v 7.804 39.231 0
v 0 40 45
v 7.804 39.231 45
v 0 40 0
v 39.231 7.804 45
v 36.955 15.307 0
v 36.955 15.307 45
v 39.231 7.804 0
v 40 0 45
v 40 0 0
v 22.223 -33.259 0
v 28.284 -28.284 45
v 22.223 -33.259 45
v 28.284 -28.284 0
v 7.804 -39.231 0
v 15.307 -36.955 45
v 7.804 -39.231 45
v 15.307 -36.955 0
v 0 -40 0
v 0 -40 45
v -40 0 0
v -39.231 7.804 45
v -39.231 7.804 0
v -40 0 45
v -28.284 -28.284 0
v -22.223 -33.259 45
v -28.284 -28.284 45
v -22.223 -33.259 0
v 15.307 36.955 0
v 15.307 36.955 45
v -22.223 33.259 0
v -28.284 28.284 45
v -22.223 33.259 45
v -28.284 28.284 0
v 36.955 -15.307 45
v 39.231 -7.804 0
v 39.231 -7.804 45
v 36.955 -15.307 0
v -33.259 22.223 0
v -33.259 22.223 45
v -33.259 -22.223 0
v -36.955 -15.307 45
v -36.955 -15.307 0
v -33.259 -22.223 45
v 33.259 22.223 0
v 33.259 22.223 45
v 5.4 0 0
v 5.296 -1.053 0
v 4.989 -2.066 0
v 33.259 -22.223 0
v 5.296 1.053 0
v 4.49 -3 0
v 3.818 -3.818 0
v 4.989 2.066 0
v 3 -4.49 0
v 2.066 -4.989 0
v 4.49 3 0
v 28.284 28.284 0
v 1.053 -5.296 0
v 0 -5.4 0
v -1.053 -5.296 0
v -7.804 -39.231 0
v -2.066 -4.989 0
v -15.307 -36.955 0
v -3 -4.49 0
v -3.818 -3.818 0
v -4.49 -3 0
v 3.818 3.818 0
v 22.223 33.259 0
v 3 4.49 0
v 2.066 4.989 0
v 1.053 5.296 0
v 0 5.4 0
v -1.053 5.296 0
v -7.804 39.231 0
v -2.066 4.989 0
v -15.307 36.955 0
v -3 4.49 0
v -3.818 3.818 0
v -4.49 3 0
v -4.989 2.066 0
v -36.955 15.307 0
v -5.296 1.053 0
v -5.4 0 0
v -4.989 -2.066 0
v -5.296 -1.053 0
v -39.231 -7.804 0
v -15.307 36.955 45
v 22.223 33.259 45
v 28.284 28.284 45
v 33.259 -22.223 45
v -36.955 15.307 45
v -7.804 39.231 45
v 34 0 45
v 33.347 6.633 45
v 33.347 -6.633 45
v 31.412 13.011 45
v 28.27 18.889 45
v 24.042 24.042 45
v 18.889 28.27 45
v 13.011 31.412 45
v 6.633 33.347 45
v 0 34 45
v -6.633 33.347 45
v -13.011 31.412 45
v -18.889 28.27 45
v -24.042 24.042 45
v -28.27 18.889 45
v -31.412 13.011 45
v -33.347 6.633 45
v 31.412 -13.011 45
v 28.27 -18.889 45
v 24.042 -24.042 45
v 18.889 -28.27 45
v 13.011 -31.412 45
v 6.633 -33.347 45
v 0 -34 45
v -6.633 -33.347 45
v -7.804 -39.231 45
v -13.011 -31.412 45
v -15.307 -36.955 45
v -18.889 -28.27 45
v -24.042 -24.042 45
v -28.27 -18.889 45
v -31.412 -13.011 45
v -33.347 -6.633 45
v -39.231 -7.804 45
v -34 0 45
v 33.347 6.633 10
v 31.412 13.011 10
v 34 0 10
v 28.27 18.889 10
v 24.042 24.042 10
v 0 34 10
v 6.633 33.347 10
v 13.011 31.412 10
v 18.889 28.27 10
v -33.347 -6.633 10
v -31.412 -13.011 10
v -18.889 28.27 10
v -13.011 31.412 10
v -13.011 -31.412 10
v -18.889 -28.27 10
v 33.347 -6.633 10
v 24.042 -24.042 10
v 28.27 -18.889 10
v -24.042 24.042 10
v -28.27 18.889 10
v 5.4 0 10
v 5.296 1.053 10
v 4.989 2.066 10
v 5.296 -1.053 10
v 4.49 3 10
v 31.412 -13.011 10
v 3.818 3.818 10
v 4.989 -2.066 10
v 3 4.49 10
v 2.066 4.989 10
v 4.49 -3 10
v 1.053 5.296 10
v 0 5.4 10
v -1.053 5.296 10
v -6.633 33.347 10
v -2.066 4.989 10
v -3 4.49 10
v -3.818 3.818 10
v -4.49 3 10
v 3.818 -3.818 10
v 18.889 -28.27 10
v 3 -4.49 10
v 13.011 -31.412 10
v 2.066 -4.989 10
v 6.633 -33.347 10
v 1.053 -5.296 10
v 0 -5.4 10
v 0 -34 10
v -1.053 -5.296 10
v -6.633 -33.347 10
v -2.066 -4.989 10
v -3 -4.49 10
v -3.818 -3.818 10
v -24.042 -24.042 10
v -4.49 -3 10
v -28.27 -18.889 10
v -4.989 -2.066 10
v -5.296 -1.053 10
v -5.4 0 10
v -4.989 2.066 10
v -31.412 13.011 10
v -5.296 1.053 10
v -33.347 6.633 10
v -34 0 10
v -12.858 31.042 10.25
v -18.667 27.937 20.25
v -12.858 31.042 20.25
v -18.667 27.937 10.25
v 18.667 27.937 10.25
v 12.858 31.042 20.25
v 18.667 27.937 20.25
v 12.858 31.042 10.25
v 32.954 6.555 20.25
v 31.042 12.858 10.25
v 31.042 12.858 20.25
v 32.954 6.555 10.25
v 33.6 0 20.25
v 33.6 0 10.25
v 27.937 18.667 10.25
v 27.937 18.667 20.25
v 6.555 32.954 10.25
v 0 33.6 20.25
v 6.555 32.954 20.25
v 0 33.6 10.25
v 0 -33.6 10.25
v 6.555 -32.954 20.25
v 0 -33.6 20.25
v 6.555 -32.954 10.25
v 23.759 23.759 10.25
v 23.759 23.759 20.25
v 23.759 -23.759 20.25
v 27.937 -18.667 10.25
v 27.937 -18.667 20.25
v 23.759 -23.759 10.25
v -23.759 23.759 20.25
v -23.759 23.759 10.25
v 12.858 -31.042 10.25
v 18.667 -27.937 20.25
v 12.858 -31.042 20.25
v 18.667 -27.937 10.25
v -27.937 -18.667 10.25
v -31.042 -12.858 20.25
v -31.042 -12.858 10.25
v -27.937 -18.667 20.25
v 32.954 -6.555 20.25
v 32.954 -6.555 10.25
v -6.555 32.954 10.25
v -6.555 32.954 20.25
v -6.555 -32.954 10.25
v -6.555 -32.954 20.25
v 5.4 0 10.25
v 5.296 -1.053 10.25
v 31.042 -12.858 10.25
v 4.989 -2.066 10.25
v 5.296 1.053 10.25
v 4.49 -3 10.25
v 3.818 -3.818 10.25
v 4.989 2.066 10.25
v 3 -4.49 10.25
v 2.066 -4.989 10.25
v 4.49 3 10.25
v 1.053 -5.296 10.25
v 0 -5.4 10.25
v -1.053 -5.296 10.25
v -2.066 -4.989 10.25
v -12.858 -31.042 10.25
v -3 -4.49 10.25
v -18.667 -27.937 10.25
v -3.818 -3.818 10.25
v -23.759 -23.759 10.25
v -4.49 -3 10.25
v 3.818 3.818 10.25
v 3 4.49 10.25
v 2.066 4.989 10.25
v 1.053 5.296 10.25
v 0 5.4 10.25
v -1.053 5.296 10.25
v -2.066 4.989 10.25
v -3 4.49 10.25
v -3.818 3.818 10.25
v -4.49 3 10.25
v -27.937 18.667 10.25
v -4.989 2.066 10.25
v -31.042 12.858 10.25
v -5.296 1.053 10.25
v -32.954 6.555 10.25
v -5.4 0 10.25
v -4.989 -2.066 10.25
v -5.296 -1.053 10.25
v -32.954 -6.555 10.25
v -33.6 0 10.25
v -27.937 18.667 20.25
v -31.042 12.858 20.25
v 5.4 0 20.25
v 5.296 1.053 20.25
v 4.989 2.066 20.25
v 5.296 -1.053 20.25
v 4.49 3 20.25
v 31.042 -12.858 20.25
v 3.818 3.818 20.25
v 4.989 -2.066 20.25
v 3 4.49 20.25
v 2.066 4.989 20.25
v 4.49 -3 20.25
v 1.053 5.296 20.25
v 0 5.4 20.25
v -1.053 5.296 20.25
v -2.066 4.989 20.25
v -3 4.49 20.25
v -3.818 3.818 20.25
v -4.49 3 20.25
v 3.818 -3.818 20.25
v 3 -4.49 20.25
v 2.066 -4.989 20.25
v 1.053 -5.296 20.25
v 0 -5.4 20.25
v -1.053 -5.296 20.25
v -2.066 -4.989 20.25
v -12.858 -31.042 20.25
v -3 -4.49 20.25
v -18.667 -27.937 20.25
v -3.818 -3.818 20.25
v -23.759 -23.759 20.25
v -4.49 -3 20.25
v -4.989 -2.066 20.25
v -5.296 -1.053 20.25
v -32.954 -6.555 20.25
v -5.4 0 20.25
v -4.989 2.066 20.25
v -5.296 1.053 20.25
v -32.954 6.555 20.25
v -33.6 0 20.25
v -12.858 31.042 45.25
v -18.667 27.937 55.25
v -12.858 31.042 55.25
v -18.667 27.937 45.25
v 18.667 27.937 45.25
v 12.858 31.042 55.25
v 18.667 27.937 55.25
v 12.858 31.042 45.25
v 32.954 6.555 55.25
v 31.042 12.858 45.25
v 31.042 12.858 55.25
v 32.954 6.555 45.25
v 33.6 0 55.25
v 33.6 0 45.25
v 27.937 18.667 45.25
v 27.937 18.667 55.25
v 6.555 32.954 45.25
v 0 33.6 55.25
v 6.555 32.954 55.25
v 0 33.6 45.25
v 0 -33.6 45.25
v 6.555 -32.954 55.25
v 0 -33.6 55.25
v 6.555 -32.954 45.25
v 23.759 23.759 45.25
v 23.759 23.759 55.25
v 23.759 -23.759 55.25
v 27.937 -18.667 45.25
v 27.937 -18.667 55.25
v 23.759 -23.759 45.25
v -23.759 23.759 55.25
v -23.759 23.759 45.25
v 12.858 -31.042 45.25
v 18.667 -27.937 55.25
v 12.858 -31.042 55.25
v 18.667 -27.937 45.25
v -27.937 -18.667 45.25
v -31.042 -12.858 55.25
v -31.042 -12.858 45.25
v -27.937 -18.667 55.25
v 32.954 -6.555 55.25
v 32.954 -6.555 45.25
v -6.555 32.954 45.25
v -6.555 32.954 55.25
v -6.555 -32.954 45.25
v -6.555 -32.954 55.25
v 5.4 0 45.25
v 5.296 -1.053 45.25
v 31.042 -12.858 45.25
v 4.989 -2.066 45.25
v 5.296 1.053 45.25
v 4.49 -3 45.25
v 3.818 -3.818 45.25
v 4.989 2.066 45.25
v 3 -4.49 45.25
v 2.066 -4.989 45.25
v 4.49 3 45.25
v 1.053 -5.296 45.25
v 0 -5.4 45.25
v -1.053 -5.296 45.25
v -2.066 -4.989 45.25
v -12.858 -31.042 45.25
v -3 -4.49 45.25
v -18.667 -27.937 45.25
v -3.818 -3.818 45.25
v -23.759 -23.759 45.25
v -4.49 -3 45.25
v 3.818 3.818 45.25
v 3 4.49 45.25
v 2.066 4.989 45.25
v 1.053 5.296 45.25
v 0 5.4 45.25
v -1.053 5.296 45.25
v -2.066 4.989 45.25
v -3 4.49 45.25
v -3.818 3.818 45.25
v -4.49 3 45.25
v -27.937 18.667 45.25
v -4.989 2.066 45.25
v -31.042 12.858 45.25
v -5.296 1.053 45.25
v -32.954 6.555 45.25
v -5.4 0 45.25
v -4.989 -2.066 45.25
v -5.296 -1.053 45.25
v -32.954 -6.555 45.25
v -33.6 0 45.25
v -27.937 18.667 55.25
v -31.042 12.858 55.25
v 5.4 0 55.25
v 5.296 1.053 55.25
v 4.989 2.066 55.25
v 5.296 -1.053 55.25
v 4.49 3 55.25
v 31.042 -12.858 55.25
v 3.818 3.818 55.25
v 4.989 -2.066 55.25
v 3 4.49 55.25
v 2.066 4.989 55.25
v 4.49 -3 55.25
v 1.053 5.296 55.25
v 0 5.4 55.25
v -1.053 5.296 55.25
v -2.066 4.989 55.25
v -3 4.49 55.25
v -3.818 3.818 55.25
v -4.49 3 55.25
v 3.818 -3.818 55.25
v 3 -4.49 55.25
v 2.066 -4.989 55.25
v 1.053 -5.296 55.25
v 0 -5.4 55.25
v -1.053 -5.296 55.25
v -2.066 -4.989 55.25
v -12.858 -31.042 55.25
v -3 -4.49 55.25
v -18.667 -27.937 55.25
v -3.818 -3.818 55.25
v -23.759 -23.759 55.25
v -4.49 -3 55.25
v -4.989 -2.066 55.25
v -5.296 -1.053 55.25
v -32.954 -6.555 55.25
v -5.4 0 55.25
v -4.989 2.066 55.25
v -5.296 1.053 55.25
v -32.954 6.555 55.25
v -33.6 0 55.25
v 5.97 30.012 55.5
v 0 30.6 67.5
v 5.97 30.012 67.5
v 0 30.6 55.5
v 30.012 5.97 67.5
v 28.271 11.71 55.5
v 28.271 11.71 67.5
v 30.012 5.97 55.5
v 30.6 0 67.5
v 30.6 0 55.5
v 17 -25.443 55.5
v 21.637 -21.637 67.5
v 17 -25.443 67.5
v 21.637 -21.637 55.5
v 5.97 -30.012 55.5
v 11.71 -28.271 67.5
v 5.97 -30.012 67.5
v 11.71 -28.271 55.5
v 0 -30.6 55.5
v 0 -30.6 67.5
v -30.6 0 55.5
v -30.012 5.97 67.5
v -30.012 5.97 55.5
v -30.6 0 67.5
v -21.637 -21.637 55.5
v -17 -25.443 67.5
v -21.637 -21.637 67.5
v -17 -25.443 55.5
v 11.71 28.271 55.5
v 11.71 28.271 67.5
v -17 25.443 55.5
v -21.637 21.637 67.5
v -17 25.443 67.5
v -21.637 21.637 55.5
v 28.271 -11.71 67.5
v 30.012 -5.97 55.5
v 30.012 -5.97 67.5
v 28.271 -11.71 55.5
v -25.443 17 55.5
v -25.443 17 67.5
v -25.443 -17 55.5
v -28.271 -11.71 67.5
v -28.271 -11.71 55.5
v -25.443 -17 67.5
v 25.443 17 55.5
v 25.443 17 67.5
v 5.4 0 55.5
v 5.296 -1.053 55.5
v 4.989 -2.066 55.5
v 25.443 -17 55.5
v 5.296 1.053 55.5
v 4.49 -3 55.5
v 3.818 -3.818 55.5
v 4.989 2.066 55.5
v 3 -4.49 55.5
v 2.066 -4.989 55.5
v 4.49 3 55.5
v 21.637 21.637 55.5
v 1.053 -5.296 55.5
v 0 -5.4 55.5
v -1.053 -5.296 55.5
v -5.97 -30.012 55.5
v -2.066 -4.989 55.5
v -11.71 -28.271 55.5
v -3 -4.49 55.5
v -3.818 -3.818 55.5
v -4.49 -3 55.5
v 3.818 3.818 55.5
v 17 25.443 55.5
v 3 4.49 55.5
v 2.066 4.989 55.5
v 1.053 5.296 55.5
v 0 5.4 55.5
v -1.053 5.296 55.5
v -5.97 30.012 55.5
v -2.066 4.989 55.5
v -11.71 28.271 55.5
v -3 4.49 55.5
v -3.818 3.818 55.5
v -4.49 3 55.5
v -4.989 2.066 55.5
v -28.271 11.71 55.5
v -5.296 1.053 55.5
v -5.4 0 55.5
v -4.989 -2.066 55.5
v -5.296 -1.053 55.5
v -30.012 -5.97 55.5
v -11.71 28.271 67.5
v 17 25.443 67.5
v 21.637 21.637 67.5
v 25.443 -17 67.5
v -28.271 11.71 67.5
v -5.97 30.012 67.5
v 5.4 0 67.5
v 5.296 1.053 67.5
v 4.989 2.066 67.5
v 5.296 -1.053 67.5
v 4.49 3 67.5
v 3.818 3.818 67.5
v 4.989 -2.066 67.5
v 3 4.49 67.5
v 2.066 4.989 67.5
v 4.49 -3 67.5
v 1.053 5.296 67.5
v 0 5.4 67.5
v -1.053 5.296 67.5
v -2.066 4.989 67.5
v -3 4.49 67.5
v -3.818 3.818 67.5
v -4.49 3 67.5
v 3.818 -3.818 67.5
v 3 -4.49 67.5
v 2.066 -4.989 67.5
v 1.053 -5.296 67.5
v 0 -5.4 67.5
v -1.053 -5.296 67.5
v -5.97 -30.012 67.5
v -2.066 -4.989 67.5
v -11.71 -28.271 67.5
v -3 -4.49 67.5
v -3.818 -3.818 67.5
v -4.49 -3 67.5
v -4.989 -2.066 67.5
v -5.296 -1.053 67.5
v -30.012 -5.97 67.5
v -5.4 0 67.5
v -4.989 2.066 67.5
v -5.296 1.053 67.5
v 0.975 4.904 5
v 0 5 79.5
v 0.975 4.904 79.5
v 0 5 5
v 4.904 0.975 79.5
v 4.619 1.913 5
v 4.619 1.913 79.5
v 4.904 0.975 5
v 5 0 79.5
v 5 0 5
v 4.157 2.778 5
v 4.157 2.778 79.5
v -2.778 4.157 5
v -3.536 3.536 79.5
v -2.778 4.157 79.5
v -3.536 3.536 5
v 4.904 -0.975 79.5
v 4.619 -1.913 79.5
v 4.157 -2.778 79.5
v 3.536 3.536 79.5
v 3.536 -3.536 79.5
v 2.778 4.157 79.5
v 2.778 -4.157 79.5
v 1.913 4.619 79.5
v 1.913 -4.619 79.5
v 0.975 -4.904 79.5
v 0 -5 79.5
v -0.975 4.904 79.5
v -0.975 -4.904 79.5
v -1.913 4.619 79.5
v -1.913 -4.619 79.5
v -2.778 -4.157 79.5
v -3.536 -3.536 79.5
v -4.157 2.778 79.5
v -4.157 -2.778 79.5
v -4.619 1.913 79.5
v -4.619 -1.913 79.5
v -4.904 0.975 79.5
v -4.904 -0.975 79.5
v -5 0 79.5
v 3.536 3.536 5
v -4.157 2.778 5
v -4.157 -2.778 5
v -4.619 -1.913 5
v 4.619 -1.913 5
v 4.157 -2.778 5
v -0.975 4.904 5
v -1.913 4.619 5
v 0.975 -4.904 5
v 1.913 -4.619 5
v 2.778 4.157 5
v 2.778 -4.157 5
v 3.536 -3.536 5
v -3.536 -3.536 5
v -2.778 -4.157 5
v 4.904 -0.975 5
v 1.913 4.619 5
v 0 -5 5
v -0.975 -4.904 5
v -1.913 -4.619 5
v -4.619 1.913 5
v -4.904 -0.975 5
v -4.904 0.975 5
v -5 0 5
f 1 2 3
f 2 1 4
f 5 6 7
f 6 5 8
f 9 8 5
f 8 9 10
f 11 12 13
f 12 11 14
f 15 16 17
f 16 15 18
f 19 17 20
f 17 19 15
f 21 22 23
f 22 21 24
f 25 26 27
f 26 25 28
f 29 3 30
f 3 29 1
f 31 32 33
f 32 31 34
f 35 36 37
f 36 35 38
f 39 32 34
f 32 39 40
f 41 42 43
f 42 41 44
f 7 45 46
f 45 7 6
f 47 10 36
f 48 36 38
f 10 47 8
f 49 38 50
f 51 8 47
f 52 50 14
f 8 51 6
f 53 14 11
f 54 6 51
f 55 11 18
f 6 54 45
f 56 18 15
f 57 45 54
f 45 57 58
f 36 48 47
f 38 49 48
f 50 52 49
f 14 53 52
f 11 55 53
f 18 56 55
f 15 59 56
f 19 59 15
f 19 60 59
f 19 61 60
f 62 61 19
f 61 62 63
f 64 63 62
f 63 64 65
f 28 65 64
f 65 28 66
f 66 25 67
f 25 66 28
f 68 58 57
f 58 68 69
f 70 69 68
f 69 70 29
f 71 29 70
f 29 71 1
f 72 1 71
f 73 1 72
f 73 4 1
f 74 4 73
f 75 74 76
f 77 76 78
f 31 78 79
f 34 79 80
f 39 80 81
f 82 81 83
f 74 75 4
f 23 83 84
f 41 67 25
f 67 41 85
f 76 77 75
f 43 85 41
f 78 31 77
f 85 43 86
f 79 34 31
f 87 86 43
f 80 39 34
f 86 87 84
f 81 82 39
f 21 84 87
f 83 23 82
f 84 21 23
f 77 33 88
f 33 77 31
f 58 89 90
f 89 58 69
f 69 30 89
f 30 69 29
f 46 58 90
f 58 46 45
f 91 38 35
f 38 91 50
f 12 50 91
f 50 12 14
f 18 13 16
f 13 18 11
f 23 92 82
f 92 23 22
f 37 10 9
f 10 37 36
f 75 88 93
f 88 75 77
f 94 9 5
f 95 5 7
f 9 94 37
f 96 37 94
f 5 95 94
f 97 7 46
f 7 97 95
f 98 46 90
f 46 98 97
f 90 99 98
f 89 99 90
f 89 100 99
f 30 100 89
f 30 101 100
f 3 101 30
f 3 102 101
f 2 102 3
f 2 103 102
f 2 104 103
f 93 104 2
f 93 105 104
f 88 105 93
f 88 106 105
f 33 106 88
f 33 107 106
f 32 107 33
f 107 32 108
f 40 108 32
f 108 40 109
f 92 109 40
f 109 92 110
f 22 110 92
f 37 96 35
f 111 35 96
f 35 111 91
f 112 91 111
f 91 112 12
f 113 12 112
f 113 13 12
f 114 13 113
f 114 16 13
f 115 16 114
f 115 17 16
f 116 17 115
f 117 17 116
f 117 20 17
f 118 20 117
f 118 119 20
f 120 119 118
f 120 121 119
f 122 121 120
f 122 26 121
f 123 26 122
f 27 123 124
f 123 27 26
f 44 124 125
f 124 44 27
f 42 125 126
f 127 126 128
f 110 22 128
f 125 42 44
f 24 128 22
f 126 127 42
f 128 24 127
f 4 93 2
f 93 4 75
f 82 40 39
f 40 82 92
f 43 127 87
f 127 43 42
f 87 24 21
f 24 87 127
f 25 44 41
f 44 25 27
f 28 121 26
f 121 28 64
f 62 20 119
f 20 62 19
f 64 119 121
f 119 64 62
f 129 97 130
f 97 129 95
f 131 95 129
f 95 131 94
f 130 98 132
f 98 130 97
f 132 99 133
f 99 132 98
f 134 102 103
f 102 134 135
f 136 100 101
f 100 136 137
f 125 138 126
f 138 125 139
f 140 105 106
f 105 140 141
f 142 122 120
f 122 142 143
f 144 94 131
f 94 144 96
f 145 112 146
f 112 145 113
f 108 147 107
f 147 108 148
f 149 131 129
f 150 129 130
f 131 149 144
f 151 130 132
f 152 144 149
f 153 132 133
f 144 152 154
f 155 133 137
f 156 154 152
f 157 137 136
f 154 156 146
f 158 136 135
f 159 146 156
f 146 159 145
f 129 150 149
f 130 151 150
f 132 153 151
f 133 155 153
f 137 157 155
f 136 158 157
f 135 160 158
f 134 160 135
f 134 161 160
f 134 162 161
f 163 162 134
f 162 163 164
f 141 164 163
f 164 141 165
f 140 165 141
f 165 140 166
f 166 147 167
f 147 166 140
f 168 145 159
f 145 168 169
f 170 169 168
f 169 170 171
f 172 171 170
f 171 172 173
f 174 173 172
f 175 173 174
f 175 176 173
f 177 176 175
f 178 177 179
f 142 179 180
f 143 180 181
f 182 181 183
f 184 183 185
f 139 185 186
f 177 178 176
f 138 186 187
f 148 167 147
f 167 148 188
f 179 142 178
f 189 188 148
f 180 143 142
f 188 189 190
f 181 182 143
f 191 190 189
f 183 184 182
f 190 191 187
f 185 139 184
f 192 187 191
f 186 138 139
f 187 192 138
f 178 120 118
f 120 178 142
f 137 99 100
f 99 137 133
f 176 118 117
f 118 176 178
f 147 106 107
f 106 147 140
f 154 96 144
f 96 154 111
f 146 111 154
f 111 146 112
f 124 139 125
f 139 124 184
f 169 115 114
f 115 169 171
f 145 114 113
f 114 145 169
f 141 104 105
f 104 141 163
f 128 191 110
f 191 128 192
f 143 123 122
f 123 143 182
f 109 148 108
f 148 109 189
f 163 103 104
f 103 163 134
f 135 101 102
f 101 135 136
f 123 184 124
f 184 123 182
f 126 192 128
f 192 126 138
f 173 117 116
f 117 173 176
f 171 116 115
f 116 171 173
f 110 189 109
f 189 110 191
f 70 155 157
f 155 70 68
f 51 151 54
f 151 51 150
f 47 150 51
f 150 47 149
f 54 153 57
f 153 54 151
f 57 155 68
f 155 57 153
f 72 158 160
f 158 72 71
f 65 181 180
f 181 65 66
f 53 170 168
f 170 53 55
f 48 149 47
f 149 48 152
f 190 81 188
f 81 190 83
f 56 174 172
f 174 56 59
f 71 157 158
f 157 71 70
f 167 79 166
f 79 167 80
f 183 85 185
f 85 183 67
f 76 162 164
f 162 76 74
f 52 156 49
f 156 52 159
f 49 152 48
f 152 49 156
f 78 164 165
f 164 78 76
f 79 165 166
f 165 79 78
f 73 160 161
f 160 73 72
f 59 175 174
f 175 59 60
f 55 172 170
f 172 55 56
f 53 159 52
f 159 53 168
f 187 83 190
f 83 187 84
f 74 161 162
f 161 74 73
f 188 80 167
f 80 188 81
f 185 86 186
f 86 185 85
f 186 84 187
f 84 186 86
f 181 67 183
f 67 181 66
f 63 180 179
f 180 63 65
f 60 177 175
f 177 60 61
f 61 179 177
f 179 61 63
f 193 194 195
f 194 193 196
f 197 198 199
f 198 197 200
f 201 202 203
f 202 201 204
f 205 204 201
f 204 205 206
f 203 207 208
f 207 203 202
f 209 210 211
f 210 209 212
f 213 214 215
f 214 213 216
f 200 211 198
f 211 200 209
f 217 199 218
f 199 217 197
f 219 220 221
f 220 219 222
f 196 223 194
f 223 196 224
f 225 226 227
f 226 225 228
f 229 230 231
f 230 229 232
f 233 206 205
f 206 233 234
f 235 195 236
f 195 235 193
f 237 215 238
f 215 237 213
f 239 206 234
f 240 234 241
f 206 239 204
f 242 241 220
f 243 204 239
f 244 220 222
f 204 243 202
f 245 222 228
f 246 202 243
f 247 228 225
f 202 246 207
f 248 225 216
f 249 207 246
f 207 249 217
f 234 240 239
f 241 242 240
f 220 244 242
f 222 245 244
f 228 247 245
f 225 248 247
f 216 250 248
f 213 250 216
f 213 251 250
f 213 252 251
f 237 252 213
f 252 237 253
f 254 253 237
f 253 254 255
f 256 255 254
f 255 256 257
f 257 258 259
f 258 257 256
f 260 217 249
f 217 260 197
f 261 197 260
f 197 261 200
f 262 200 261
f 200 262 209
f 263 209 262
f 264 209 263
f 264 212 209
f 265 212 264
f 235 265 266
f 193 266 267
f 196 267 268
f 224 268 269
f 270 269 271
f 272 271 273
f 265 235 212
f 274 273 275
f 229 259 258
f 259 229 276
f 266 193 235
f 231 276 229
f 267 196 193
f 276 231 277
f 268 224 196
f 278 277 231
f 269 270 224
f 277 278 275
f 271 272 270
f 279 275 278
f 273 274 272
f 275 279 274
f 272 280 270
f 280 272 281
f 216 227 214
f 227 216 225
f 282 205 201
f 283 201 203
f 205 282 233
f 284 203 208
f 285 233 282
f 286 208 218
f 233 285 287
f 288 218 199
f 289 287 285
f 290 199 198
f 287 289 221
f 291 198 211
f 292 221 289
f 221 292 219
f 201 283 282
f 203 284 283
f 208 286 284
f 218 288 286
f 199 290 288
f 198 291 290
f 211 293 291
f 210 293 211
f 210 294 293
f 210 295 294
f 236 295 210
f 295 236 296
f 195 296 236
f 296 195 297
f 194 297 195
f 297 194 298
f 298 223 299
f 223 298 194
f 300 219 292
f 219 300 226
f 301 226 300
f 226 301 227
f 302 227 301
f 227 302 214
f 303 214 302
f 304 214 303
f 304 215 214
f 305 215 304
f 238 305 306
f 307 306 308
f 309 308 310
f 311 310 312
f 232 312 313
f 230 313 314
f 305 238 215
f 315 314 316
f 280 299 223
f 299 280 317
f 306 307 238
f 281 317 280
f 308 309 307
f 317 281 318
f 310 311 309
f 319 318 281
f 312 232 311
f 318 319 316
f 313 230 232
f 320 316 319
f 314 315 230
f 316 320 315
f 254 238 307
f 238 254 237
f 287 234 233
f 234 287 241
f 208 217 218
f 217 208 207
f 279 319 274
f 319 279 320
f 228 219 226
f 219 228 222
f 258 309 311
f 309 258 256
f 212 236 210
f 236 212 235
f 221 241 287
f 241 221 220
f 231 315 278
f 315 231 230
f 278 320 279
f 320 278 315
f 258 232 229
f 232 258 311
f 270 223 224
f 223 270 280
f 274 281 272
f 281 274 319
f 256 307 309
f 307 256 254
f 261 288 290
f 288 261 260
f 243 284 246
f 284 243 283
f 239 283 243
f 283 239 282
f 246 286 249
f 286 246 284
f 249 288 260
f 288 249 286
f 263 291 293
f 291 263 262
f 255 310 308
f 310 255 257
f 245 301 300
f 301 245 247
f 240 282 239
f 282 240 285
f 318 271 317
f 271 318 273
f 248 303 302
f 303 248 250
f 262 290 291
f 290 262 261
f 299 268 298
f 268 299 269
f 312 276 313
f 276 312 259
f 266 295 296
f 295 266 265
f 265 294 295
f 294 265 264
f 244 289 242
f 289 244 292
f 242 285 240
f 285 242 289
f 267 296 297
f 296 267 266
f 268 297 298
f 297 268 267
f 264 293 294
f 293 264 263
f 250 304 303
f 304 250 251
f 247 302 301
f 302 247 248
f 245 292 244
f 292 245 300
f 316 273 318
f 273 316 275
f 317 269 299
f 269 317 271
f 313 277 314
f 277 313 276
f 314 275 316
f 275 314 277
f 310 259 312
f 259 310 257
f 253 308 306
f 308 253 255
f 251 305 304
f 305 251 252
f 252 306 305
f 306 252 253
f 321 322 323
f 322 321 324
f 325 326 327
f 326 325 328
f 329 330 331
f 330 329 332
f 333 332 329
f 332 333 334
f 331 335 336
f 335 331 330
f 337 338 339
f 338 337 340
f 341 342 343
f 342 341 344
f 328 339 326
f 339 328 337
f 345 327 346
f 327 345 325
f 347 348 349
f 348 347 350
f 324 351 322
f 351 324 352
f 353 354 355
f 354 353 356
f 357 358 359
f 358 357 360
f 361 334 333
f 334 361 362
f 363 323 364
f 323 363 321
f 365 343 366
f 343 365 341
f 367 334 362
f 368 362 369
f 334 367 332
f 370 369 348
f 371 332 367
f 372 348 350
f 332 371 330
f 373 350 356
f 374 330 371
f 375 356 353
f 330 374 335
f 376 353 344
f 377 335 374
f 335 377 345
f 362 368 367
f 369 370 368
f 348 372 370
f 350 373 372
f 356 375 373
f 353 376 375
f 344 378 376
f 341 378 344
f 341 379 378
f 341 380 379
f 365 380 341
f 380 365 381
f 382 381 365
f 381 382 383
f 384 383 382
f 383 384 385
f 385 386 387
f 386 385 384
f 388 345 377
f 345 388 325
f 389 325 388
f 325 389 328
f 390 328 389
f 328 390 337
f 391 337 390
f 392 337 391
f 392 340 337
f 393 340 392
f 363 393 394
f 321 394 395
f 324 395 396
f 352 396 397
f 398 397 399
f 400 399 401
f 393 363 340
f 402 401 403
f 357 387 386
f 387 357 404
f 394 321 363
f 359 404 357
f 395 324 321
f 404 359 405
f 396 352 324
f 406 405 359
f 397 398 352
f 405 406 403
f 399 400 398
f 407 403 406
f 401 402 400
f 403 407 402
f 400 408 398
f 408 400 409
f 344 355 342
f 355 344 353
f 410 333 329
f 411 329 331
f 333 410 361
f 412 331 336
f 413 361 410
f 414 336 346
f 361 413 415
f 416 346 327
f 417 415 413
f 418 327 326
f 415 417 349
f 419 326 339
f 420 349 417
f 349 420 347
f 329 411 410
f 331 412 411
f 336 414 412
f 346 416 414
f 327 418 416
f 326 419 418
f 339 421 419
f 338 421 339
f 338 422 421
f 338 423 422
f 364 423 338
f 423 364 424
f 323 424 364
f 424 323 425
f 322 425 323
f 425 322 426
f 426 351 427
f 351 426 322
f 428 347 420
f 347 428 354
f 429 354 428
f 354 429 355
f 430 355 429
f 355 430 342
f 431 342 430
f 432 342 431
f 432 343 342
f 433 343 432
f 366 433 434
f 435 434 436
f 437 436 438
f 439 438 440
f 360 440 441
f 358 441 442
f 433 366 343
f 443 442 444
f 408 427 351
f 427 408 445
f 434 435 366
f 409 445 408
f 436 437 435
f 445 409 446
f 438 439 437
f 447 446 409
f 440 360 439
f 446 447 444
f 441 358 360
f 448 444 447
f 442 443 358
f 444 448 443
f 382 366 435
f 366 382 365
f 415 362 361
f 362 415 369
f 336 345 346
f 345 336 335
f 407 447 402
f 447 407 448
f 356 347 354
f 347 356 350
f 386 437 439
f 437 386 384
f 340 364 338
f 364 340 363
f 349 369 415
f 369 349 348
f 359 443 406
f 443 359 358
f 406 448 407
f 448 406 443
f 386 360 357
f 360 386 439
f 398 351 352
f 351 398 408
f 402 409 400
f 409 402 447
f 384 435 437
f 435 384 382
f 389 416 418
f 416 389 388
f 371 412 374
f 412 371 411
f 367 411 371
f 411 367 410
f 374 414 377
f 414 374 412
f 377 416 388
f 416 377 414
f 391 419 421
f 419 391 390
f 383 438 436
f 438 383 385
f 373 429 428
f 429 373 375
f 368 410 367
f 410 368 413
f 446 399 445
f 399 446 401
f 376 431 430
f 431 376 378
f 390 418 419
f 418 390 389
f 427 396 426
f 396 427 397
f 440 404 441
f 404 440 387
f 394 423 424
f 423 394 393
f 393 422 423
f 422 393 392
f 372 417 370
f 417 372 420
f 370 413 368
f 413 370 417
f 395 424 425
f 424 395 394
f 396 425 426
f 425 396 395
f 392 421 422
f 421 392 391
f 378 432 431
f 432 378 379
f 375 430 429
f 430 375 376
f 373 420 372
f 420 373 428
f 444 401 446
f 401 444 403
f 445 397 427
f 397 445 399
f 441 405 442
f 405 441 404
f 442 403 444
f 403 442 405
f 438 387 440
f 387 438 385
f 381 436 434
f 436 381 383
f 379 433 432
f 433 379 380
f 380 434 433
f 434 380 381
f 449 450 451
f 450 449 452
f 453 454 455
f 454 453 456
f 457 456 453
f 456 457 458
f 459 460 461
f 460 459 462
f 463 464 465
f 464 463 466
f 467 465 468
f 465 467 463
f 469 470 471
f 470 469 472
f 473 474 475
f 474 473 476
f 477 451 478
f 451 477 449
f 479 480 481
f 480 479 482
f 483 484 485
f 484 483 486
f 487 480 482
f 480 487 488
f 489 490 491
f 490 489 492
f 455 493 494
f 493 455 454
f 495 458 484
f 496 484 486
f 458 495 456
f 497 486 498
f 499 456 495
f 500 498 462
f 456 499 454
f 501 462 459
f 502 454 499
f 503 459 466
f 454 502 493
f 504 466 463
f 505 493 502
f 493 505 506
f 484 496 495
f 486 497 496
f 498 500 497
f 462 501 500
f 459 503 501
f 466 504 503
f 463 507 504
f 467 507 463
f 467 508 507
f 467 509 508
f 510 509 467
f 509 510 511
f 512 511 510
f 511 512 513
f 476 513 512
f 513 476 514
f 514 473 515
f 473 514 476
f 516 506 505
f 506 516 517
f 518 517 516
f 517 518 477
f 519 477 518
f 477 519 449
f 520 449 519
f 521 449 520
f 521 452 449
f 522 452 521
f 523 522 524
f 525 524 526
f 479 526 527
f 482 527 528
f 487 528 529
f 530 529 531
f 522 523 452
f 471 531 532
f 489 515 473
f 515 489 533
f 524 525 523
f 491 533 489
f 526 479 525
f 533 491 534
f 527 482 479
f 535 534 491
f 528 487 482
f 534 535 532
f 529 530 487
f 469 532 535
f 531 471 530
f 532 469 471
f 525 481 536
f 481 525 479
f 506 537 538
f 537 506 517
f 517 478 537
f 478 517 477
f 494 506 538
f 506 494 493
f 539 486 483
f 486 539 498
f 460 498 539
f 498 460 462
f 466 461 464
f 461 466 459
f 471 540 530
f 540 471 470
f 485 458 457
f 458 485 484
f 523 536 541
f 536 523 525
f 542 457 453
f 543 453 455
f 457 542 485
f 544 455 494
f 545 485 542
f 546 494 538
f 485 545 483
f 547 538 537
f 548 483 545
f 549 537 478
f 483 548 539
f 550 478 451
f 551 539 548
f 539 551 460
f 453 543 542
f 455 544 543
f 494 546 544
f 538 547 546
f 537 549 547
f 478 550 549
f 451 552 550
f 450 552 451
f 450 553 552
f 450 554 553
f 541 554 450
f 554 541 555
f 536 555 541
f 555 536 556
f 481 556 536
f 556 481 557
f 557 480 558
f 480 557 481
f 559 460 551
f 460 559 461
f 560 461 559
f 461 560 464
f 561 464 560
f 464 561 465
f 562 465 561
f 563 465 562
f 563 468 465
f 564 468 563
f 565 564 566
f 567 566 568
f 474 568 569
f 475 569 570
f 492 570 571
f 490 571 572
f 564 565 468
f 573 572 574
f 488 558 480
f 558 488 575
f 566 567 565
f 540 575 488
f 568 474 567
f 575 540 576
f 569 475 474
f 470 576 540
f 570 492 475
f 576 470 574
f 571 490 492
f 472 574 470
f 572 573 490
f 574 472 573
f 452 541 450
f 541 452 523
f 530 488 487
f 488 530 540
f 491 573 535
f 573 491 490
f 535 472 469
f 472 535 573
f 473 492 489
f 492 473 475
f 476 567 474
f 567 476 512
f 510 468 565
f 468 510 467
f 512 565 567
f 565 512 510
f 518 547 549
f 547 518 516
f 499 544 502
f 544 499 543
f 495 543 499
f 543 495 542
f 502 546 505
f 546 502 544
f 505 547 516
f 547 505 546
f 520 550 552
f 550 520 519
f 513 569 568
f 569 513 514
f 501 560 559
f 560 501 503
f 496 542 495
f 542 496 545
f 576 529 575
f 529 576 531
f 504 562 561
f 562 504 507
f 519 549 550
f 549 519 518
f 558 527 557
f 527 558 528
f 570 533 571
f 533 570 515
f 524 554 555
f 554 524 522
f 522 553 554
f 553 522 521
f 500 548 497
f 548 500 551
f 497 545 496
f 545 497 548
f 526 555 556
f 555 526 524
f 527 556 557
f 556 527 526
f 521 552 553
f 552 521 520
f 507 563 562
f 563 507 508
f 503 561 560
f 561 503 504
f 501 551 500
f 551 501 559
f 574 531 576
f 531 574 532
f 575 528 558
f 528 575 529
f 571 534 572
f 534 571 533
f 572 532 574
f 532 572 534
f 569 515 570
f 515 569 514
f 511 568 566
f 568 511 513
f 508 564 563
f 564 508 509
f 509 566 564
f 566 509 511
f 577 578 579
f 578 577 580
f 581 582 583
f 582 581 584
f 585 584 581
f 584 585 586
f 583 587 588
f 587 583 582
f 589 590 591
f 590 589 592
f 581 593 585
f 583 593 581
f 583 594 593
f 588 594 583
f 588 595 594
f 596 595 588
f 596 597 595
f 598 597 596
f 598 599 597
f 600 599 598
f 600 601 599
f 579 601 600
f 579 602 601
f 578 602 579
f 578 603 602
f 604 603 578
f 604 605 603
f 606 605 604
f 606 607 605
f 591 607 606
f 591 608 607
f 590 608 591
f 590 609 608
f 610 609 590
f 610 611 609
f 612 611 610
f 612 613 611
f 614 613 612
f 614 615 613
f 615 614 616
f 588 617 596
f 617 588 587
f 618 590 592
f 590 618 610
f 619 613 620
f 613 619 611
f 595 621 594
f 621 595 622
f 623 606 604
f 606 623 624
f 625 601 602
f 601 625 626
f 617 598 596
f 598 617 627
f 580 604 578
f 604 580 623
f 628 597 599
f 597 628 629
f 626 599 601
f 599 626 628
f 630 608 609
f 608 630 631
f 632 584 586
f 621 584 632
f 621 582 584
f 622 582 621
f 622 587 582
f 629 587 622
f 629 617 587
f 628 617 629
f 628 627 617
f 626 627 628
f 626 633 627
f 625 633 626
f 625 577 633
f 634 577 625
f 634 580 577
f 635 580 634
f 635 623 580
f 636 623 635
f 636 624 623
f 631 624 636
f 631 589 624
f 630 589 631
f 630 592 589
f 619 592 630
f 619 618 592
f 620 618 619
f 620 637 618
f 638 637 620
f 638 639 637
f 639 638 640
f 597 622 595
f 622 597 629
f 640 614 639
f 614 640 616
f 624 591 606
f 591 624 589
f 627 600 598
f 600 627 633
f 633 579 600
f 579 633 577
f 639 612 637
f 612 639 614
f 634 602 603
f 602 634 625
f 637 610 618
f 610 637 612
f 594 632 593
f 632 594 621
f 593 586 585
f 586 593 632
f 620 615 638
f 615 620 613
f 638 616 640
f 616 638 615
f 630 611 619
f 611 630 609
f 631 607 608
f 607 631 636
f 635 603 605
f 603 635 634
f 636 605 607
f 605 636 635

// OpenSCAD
$fn = 32;

// ------------------------------------------------------------------------
// Bearing housing: housing d80, two bearings and a shaft
// Every part is its own module, assembly() places them once.
// ------------------------------------------------------------------------

// --- part 1 ---
module housing() {
  difference() {
    cylinder(h = 45, d = 80);
    translate([0, 0, 10]) cylinder(h = 36, d = 68);
    translate([0, 0, -1]) cylinder(h = 12, d = 10.8);
  }
}

// --- part 2 ---
module bearing_lower() {
  difference() {
      translate([0, 0, 0]) cylinder(h = 10, d = 67.2);
      translate([0, 0, -1]) cylinder(h = 12, d = 10.8);
    }
}

// --- part 3 ---
module bearing_upper() {
  difference() {
      translate([0, 0, 0]) cylinder(h = 10, d = 67.2);
      translate([0, 0, -1]) cylinder(h = 12, d = 10.8);
    }
}

// --- part 4 ---
module spacer() {
  difference() {
      translate([0, 0, 0]) cylinder(h = 12, d = 61.2);
      translate([0, 0, -1]) cylinder(h = 14, d = 10.8);
    }
}

// --- part 5 ---
module shaft() {
  translate([0, 0, -37.25]) cylinder(h = 74.5, d = 10);
}

// --- assembly ---
module assembly() {
  translate([0, 0, 0]) rotate([0, 0, 0]) housing();
  translate([0, 0, 10.25]) rotate([0, 0, 0]) bearing_lower();
  translate([0, 0, 45.25]) rotate([0, 0, 0]) bearing_upper();
  translate([0, 0, 55.5]) rotate([0, 0, 0]) spacer();
  translate([0, 0, 42.25]) rotate([0, 0, 0]) shaft();
}

assembly();
